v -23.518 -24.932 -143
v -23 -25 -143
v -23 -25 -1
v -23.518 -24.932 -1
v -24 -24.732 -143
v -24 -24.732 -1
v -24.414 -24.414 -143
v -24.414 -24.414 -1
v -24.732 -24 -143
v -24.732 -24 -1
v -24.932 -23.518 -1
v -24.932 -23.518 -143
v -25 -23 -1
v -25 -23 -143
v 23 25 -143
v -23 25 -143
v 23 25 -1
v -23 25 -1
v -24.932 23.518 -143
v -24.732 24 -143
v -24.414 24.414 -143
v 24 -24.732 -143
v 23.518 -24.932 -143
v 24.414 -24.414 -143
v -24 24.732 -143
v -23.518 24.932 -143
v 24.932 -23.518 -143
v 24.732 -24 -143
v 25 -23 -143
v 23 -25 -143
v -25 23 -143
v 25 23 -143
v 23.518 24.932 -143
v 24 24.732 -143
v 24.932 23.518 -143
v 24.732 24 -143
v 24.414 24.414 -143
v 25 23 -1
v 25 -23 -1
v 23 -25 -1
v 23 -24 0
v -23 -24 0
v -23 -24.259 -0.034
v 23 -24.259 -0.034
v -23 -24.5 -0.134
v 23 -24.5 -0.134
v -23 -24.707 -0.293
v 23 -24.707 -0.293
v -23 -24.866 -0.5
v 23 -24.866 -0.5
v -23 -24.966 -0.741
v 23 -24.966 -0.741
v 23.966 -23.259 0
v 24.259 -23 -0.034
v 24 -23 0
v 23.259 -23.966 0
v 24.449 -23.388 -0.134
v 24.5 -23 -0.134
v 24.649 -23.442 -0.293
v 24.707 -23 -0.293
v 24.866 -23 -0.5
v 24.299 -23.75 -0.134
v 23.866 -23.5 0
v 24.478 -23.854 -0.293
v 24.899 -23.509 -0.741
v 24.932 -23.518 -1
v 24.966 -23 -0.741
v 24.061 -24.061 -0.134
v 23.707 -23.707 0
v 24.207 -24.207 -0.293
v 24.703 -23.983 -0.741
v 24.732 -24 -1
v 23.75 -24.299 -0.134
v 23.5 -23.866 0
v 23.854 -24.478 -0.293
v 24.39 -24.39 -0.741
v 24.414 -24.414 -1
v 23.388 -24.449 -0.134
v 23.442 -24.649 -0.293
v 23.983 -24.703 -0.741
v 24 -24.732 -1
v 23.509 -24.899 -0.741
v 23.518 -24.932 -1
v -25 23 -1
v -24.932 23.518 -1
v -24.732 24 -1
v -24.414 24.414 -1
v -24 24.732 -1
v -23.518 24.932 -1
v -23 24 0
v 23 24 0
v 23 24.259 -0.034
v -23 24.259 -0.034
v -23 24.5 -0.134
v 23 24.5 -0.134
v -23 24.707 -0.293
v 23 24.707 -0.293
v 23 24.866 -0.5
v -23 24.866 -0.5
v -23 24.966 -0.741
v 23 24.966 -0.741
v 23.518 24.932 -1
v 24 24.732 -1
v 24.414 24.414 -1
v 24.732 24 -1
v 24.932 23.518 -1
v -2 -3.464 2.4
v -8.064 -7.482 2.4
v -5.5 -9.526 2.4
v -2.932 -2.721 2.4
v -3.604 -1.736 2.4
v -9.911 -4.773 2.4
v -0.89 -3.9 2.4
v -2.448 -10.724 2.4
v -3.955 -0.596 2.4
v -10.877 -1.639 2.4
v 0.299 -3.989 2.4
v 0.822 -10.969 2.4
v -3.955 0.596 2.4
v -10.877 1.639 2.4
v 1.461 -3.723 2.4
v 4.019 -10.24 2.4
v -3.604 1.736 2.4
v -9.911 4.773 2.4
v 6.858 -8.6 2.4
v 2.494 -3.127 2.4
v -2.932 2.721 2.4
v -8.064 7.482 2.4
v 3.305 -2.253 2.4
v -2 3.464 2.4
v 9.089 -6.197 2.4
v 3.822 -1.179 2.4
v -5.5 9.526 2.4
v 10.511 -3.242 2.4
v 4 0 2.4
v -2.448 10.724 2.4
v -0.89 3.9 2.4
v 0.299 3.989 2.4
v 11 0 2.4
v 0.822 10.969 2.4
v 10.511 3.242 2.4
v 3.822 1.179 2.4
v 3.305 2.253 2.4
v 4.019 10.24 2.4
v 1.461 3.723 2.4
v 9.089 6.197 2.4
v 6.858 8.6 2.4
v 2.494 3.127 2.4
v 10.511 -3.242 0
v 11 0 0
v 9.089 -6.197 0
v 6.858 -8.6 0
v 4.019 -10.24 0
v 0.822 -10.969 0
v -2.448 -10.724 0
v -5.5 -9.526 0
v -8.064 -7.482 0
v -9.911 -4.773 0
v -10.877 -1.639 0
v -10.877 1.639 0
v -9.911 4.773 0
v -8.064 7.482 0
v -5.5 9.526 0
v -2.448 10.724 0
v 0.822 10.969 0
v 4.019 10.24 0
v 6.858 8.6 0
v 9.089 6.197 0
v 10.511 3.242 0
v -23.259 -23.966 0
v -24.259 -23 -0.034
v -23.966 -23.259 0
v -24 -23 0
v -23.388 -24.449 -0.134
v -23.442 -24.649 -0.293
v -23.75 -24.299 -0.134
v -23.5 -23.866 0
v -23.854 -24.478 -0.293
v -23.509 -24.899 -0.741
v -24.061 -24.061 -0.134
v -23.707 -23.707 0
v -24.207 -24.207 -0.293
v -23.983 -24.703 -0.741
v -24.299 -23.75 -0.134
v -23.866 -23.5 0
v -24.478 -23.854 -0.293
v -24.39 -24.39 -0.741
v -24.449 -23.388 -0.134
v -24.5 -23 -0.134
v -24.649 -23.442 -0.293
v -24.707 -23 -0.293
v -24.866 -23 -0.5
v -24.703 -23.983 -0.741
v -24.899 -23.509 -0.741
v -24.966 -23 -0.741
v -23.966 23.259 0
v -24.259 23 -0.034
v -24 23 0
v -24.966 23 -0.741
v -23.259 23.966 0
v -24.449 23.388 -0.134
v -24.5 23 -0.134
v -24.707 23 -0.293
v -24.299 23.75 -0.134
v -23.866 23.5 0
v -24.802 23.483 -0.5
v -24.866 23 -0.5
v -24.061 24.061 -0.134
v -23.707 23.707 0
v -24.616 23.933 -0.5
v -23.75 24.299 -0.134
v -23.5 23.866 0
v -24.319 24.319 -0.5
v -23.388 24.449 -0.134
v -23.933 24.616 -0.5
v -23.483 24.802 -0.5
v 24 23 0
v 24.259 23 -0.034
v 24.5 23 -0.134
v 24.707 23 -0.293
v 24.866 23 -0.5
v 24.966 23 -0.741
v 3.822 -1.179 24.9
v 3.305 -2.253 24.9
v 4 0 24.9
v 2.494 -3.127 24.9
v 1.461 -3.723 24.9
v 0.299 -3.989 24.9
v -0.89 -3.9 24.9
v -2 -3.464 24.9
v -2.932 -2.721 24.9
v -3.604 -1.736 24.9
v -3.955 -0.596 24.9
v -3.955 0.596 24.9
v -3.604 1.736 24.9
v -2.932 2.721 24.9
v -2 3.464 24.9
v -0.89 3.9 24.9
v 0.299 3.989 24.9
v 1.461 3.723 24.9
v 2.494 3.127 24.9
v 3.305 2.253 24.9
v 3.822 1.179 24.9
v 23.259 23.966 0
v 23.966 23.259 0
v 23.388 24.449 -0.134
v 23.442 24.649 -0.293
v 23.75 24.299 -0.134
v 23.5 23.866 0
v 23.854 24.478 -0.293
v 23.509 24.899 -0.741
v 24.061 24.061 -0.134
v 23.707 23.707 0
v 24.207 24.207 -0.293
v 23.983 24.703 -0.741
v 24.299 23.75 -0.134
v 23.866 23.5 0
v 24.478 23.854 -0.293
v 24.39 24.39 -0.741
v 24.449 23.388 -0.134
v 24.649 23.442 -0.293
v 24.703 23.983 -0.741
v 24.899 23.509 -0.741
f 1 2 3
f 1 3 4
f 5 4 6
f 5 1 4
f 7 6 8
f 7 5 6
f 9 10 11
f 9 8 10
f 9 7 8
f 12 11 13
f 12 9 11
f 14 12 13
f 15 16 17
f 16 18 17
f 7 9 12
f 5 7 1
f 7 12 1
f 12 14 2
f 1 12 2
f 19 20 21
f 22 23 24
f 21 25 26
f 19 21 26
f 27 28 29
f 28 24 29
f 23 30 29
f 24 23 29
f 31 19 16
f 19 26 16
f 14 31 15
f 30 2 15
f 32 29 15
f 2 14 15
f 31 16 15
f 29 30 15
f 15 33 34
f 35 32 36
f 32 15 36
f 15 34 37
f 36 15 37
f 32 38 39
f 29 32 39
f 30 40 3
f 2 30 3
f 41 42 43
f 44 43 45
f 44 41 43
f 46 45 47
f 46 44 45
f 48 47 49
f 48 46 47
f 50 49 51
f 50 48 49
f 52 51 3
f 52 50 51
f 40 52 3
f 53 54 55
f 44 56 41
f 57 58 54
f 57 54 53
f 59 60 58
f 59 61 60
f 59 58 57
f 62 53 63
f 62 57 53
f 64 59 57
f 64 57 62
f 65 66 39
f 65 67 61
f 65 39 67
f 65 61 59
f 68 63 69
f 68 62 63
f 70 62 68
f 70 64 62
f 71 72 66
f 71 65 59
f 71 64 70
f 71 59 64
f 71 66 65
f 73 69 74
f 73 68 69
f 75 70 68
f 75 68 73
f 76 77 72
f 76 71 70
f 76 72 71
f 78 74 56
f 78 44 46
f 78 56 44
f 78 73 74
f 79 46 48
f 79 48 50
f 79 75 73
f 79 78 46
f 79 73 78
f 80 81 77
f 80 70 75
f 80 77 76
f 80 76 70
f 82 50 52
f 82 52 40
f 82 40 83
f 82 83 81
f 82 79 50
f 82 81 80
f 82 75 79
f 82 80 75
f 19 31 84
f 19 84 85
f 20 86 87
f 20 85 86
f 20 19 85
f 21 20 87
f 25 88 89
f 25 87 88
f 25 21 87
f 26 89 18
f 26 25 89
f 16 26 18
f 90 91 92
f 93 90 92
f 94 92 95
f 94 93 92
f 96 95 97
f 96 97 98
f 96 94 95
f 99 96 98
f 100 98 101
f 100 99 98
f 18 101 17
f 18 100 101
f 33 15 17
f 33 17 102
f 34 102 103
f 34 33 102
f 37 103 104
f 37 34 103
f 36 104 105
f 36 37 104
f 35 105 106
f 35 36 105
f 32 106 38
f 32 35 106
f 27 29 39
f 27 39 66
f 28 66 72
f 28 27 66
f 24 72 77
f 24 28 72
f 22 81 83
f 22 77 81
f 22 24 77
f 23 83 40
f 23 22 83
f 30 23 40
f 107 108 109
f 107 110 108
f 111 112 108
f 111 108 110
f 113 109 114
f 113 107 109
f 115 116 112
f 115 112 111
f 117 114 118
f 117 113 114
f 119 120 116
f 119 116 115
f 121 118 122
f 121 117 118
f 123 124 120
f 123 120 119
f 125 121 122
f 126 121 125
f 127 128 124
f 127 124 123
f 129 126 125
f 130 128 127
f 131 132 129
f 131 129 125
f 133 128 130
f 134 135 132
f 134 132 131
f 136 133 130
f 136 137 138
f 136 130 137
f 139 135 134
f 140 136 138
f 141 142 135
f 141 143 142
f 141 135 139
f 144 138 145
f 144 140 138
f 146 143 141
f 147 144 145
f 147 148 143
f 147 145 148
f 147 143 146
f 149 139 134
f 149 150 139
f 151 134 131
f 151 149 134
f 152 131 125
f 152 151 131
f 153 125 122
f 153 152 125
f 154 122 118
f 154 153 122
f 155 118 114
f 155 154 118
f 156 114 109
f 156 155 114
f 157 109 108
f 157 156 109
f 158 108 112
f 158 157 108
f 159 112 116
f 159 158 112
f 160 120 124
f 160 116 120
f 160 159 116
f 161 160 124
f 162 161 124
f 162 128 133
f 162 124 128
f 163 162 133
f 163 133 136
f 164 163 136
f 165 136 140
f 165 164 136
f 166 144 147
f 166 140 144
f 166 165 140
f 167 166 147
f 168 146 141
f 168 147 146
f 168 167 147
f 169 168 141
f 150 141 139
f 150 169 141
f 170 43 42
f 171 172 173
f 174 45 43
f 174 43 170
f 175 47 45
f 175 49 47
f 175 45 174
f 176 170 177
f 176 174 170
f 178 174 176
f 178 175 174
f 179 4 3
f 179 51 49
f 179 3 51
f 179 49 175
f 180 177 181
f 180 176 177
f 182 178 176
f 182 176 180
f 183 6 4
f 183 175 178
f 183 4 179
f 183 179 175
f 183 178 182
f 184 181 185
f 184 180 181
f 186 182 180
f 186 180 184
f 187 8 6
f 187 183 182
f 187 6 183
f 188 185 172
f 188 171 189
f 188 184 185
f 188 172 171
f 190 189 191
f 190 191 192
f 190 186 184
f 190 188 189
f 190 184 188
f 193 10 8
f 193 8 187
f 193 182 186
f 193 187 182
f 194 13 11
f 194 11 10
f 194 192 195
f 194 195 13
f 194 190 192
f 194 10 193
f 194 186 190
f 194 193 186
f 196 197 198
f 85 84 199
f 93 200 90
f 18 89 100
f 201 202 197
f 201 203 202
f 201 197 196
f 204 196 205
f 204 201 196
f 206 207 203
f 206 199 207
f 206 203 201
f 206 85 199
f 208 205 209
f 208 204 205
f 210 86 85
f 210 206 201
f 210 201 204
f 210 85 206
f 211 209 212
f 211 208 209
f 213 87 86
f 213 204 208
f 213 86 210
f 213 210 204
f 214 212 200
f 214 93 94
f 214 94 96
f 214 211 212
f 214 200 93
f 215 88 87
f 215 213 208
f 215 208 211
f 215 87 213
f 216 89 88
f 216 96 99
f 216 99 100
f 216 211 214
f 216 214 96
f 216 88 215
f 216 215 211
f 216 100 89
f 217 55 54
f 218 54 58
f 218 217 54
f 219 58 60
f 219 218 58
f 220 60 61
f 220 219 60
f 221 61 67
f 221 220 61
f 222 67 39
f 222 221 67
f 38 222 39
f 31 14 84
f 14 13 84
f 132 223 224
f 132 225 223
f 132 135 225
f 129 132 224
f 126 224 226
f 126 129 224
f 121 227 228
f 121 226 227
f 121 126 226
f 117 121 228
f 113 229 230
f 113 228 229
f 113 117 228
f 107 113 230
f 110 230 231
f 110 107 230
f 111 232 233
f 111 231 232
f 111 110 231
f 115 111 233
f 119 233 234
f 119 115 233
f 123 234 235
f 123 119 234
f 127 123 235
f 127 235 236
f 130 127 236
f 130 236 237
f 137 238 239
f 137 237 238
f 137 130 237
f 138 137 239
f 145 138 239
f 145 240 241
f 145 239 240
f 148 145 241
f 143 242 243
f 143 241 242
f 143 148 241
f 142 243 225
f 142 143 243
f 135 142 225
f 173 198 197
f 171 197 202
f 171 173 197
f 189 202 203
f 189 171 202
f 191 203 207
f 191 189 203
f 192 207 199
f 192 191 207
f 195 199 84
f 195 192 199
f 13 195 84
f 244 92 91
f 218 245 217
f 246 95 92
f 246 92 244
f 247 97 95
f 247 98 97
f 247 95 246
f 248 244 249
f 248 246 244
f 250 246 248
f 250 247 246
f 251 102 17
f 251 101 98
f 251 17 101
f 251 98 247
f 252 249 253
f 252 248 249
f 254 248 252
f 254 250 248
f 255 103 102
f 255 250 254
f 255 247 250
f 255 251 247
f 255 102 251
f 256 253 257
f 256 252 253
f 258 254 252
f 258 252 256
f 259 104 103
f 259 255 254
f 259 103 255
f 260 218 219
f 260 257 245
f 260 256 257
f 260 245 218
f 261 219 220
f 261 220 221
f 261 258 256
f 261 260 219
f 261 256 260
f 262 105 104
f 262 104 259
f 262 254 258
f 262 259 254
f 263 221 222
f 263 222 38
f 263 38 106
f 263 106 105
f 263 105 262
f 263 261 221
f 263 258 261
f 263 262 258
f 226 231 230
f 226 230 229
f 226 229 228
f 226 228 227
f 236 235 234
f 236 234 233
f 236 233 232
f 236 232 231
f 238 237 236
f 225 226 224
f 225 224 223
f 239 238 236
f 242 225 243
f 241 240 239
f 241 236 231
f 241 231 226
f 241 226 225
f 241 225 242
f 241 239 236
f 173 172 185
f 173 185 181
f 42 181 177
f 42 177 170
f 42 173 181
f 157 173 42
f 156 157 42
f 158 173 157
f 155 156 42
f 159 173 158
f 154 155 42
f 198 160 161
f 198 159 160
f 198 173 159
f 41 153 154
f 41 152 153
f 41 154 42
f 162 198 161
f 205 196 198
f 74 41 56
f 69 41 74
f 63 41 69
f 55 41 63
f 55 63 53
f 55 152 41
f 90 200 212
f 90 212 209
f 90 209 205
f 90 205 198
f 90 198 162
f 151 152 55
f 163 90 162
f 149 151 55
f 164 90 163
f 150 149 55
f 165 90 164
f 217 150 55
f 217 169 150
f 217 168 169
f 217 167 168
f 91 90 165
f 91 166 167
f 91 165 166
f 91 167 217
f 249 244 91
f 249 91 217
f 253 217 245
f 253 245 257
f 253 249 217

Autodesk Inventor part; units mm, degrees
ref_plane "YZ Plane" through (0, 0, 0) normal (1, 0, 0) x (0, 1, 0)
ref_plane "XZ Plane" through (0, 0, 0) normal (0, 1, 0) x (-1, 0, 0)
ref_plane "XY Plane" through (0, 0, 0) normal (0, 0, 1) x (1, 0, 0)
sketch "Sketch1" plane through (0, 0, 0) normal (0, 0, 1) x (1, 0, 0)
  line L0 (-25, 25) -> (25, 25)
  line L1 (25, 25) -> (25, -25)
  line L2 (25, -25) -> (-25, -25)
  line L3 (-25, -25) -> (-25, 25)
  point P0 (0, 0)
  dimension "d0" = 50
  dimension "d1" = 50
  dimension "d2" = 25
  dimension "d3" = 25
extrude "Extrusion1" add sketch "Sketch1" against normal blind 143
sketch "Sketch2" plane through (0, 0, 0) normal (0, 0, 1) x (1, 0, 0)
  circle A0 centre (0, 0) radius 11
  dimension "d7" = 22
extrude "Extrusion2" add sketch "Sketch2" along normal blind 2.4
sketch "Sketch3" plane through (0, 0, 2.4) normal (0, 0, 1) x (1, 0, 0)
  circle A0 centre (0, 0) radius 4
  dimension "d10" = 8
extrude "Extrusion3" add sketch "Sketch3" along normal blind 22.5
fillet "Fillet1" radius 2 4 edges at (-25, 25, -71.5) (25, 25, -71.5) (25, -25, -71.5) (-25, -25, -71.5)
fillet "Fillet2" radius 1 8 edges at (-24.4142, 24.4142, 0) (-25, 0, 0) (-24.4142, -24.4142, 0) (0, -25, 0) (24.4142, -24.4142, 0) (25, 0, 0) (24.4142, 24.4142, 0) (0, 25, 0)
properties part number "Electric Motor"
